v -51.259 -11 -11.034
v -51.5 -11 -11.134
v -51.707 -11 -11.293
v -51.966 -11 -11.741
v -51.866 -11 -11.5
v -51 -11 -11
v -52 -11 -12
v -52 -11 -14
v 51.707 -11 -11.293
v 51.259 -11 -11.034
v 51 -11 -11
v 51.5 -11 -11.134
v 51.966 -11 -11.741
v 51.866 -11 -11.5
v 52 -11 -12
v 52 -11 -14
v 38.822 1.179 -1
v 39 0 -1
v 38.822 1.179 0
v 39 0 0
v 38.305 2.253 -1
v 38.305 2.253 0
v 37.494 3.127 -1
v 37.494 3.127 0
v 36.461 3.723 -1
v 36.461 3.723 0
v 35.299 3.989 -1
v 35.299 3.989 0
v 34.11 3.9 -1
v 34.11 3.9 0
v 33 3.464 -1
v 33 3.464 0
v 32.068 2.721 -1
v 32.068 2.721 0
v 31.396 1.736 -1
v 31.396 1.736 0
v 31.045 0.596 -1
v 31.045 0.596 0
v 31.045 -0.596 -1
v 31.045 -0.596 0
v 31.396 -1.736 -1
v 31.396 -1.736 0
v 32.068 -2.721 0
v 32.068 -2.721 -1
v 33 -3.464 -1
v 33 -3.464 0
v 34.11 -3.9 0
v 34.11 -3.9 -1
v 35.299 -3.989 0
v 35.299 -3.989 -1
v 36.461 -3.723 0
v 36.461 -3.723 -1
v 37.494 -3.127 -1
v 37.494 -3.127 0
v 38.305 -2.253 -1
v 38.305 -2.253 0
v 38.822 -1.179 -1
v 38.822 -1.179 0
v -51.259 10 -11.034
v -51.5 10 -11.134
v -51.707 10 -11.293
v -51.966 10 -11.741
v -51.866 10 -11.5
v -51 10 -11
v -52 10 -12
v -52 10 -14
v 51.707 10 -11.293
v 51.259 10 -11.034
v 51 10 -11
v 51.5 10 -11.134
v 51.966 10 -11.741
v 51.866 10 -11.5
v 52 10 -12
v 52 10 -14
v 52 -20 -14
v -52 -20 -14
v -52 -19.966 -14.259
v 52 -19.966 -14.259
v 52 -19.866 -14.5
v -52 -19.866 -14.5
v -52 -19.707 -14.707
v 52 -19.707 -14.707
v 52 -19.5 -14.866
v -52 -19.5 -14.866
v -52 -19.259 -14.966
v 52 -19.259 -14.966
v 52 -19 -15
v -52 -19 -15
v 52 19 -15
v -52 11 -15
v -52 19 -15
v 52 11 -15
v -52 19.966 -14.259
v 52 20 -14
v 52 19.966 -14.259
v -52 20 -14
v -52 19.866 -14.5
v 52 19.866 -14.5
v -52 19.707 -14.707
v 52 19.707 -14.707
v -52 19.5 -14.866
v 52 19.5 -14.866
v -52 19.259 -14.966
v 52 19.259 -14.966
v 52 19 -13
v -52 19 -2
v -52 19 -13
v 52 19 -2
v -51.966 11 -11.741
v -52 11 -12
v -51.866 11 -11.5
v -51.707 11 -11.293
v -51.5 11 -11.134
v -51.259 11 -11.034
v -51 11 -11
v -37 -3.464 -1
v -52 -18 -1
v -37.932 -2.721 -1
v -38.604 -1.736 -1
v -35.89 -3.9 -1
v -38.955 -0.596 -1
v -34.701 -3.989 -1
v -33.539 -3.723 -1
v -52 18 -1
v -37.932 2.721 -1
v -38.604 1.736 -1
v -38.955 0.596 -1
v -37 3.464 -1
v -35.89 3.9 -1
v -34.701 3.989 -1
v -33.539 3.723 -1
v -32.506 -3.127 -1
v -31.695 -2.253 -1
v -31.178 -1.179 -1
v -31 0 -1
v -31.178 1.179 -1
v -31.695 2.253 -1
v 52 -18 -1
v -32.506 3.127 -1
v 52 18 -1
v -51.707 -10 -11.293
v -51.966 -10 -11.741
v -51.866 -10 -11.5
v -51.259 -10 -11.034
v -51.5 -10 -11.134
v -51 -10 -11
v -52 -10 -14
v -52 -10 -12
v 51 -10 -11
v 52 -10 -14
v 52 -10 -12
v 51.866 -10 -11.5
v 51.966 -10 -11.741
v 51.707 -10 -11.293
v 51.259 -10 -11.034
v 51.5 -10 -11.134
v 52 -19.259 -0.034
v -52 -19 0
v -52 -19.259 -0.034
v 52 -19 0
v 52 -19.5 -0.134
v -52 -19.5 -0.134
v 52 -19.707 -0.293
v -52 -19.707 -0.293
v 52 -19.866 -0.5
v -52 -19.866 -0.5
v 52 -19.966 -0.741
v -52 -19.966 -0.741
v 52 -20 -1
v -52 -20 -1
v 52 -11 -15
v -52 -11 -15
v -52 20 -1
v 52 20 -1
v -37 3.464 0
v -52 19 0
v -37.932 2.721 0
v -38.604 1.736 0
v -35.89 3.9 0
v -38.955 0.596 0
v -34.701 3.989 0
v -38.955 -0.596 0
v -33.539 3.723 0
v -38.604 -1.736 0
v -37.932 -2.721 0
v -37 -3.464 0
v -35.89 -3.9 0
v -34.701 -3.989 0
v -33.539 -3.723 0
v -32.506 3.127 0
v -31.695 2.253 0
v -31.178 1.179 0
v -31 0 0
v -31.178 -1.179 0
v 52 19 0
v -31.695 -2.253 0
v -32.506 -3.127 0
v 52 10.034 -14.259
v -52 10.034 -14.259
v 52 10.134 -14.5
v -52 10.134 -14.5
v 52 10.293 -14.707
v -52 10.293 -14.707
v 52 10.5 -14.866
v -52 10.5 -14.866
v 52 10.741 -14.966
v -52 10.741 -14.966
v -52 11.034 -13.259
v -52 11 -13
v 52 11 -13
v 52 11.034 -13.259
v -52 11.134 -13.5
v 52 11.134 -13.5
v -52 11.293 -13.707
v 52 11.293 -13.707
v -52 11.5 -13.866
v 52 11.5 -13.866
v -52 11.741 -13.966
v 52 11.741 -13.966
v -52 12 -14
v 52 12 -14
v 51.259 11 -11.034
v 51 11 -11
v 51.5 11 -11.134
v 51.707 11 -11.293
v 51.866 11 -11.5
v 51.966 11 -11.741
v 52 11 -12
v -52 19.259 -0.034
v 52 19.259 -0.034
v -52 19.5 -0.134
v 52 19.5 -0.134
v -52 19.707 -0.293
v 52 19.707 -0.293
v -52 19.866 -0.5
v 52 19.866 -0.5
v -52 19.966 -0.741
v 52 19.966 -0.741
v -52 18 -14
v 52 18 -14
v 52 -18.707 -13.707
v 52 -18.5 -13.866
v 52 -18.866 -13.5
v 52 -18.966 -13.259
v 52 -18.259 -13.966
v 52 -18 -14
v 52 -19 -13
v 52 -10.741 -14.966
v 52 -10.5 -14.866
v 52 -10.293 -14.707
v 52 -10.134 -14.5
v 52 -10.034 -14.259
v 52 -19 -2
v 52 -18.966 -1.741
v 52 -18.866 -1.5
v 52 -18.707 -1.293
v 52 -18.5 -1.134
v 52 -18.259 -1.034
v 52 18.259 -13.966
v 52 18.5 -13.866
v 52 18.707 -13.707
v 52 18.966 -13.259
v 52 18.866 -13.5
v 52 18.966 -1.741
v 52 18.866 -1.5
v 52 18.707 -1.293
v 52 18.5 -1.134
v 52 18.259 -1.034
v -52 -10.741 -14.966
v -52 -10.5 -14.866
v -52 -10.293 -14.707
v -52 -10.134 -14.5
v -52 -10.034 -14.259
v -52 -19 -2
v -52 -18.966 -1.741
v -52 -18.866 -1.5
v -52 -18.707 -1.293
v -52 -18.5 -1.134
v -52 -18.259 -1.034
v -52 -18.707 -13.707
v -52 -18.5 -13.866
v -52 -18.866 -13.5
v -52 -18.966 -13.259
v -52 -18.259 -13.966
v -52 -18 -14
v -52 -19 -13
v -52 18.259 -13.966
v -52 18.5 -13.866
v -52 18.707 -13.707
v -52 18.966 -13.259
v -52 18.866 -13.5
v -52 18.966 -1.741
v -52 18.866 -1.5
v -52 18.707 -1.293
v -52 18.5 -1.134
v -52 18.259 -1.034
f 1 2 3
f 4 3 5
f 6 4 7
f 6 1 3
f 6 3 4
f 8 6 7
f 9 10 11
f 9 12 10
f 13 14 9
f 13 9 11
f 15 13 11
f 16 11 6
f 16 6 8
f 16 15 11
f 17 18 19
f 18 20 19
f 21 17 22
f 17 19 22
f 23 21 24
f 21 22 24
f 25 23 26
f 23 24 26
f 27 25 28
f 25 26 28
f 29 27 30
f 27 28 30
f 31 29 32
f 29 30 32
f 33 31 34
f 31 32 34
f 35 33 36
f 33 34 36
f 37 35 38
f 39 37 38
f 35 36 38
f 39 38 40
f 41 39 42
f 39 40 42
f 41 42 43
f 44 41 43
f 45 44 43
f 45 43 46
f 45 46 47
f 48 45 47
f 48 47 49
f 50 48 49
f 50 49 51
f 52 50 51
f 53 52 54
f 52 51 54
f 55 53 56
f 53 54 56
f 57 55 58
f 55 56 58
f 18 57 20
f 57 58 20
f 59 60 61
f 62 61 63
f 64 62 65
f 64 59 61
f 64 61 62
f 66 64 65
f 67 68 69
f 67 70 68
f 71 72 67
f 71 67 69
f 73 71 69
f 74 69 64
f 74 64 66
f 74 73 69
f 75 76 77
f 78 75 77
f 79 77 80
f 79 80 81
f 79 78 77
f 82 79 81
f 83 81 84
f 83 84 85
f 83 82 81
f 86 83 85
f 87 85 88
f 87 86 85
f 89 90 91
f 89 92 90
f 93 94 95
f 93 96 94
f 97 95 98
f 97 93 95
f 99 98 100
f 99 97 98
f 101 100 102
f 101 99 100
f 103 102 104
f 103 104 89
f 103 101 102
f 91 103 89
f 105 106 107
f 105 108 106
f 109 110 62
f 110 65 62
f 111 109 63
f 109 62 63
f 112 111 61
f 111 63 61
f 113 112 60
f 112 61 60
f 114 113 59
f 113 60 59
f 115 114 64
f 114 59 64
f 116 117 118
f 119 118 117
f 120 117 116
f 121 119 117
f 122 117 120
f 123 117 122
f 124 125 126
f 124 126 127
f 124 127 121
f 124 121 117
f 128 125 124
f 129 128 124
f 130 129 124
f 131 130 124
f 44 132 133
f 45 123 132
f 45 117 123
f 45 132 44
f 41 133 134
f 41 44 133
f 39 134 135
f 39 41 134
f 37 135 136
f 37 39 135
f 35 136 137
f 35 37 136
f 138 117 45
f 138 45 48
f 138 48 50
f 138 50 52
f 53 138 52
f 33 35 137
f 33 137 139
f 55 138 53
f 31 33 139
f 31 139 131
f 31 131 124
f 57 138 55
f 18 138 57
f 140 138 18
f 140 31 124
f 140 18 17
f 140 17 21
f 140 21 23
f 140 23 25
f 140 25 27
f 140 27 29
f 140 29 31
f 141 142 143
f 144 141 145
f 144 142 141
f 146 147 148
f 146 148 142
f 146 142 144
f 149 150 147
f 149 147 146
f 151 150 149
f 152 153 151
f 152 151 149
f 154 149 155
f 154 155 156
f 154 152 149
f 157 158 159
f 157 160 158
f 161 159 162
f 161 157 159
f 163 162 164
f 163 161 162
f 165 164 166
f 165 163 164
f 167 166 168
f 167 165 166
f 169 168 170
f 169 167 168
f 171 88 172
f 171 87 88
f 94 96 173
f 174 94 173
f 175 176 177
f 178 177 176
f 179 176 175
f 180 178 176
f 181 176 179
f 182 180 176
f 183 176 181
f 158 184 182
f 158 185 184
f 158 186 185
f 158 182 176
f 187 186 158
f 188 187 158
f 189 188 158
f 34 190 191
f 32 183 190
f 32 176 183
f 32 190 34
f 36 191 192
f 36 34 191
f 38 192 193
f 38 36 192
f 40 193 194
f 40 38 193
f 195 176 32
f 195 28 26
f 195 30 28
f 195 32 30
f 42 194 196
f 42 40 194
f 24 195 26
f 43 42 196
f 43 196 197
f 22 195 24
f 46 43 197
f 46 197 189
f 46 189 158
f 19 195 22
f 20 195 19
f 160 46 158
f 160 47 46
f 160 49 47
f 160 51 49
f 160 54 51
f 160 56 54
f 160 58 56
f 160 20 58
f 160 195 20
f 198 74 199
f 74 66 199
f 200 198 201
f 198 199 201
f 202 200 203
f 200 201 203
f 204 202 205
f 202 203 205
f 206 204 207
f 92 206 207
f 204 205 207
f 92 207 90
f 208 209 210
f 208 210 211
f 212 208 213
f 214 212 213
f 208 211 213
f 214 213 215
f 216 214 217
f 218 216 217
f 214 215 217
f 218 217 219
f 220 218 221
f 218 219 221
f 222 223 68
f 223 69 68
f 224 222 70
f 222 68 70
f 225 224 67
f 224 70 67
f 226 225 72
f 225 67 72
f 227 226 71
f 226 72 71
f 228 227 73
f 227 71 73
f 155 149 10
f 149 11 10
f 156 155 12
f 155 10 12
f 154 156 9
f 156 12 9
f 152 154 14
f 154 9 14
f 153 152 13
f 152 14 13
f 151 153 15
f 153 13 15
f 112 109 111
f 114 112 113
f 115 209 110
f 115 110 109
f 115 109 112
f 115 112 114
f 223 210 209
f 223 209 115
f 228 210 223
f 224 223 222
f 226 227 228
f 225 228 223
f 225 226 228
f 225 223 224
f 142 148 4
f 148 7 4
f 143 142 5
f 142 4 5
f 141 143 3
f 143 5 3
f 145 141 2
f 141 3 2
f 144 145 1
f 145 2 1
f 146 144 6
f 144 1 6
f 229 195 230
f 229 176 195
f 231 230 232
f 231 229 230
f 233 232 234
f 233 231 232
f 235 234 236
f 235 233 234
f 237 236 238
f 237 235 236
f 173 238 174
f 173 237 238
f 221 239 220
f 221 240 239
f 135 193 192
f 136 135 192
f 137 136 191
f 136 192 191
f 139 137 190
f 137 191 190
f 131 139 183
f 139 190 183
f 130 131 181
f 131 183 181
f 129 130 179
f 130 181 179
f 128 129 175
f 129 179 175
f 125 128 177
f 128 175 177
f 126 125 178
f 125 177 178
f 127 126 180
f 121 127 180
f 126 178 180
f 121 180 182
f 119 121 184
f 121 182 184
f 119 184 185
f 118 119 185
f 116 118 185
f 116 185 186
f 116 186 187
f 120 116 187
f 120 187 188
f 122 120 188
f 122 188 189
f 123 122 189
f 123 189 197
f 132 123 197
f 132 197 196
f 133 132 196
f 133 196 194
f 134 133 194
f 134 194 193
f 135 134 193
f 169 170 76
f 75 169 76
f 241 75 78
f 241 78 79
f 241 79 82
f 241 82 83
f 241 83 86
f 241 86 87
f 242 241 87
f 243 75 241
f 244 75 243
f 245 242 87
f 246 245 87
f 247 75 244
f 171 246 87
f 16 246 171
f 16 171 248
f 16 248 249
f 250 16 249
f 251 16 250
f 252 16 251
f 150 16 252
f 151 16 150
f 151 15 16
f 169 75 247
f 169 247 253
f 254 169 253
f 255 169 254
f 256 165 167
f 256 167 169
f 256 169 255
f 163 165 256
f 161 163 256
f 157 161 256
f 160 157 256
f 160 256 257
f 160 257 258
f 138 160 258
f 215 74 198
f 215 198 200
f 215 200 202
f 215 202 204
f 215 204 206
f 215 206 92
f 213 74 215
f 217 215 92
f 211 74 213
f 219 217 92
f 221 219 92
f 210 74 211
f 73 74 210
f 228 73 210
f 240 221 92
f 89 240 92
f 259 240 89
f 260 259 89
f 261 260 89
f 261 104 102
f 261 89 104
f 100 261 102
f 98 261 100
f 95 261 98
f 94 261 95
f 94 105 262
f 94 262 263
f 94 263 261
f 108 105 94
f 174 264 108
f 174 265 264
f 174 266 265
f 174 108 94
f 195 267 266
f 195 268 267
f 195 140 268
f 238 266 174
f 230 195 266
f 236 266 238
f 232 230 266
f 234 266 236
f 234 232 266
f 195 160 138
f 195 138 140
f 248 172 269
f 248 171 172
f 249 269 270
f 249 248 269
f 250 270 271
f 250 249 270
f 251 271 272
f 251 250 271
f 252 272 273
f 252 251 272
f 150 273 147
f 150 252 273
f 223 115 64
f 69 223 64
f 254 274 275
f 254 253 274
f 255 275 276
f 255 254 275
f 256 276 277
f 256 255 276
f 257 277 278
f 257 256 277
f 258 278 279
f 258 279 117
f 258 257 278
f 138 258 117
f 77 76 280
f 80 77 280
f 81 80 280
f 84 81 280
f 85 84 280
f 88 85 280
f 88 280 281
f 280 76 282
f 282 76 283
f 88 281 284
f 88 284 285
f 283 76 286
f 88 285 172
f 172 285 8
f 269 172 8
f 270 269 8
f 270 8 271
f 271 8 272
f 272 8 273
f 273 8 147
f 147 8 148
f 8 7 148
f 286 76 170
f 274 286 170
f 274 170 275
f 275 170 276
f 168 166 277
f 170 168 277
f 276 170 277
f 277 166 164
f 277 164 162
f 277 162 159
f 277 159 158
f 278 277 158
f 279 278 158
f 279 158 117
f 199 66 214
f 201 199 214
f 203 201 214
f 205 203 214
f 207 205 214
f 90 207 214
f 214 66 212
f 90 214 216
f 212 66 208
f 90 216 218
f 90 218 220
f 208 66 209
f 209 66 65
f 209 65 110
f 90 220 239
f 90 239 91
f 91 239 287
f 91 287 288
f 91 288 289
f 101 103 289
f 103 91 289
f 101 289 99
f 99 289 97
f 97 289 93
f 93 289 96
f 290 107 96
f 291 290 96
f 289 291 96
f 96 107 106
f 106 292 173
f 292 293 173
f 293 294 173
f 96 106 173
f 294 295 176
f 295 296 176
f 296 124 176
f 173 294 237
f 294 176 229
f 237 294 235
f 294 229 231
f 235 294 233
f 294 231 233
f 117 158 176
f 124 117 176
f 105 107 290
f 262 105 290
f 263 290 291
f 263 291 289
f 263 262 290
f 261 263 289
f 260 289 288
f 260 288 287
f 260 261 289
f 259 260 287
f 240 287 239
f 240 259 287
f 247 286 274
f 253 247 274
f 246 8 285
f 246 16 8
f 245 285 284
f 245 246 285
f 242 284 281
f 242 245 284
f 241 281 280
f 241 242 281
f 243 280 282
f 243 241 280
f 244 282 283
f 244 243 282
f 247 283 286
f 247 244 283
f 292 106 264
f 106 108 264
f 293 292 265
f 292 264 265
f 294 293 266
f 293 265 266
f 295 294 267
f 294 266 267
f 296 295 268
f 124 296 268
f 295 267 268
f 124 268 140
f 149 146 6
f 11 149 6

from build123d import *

# Parameters (mm, degrees)
F1_DEPTH = 52
F2_R     = 4
F3_DEPTH = 12.5
F4_R     = 1
F5_R     = 1
F6_R     = 1


with BuildPart() as f1:
    # F0 (on Right) → F1 (new body, symmetric)
    with BuildSketch(Plane.YZ):
        Polygon((20, 0), (-20, 0), (-20, -15), (-10, -15), (-10, -11), (-11, -11), (-11, -14), (-19, -14), (-19, -1), (19, -1), (19, -14), (11, -14), (11, -11), (10, -11), (10, -15), (20, -15), align=None)
    extrude(amount=F1_DEPTH, both=True)

    # F2 (on Top) → F3 (cut, symmetric)
    with BuildSketch(Plane.XY):
        with Locations((-35, 0)):
            Circle(F2_R)
        with Locations((35, 0)):
            Circle(F2_R)
    extrude(amount=F3_DEPTH, both=True, mode=Mode.SUBTRACT)

    # F4
    f4_edges = [f1.edges().sort_by_distance(p)[0] for p in [
        (0, -20, -15),
        (0, -20, 0),
        (0, -10, -15),
        (0, 10, -15),
        (0, 20, -15),
        (0, 20, 0),
        (0, 19, -14),
        (0, -19, -14),
    ]]
    fillet(f4_edges, radius=F4_R)

    # F5
    f5_edges = [f1.edges().sort_by_distance(p)[0] for p in [
        (0, 11, -14),
        (0, 19, -1),
        (0, -19, -1),
    ]]
    fillet(f5_edges, radius=F5_R)

    # F6
    f6_edges = [f1.edges().sort_by_distance(p)[0] for p in [
        (52, -10.5, -11),
        (52, 10.5, -11),
        (-52, 10.5, -11),
        (-52, -10.5, -11),
    ]]
    fillet(f6_edges, radius=F6_R)


solid = f1.part
